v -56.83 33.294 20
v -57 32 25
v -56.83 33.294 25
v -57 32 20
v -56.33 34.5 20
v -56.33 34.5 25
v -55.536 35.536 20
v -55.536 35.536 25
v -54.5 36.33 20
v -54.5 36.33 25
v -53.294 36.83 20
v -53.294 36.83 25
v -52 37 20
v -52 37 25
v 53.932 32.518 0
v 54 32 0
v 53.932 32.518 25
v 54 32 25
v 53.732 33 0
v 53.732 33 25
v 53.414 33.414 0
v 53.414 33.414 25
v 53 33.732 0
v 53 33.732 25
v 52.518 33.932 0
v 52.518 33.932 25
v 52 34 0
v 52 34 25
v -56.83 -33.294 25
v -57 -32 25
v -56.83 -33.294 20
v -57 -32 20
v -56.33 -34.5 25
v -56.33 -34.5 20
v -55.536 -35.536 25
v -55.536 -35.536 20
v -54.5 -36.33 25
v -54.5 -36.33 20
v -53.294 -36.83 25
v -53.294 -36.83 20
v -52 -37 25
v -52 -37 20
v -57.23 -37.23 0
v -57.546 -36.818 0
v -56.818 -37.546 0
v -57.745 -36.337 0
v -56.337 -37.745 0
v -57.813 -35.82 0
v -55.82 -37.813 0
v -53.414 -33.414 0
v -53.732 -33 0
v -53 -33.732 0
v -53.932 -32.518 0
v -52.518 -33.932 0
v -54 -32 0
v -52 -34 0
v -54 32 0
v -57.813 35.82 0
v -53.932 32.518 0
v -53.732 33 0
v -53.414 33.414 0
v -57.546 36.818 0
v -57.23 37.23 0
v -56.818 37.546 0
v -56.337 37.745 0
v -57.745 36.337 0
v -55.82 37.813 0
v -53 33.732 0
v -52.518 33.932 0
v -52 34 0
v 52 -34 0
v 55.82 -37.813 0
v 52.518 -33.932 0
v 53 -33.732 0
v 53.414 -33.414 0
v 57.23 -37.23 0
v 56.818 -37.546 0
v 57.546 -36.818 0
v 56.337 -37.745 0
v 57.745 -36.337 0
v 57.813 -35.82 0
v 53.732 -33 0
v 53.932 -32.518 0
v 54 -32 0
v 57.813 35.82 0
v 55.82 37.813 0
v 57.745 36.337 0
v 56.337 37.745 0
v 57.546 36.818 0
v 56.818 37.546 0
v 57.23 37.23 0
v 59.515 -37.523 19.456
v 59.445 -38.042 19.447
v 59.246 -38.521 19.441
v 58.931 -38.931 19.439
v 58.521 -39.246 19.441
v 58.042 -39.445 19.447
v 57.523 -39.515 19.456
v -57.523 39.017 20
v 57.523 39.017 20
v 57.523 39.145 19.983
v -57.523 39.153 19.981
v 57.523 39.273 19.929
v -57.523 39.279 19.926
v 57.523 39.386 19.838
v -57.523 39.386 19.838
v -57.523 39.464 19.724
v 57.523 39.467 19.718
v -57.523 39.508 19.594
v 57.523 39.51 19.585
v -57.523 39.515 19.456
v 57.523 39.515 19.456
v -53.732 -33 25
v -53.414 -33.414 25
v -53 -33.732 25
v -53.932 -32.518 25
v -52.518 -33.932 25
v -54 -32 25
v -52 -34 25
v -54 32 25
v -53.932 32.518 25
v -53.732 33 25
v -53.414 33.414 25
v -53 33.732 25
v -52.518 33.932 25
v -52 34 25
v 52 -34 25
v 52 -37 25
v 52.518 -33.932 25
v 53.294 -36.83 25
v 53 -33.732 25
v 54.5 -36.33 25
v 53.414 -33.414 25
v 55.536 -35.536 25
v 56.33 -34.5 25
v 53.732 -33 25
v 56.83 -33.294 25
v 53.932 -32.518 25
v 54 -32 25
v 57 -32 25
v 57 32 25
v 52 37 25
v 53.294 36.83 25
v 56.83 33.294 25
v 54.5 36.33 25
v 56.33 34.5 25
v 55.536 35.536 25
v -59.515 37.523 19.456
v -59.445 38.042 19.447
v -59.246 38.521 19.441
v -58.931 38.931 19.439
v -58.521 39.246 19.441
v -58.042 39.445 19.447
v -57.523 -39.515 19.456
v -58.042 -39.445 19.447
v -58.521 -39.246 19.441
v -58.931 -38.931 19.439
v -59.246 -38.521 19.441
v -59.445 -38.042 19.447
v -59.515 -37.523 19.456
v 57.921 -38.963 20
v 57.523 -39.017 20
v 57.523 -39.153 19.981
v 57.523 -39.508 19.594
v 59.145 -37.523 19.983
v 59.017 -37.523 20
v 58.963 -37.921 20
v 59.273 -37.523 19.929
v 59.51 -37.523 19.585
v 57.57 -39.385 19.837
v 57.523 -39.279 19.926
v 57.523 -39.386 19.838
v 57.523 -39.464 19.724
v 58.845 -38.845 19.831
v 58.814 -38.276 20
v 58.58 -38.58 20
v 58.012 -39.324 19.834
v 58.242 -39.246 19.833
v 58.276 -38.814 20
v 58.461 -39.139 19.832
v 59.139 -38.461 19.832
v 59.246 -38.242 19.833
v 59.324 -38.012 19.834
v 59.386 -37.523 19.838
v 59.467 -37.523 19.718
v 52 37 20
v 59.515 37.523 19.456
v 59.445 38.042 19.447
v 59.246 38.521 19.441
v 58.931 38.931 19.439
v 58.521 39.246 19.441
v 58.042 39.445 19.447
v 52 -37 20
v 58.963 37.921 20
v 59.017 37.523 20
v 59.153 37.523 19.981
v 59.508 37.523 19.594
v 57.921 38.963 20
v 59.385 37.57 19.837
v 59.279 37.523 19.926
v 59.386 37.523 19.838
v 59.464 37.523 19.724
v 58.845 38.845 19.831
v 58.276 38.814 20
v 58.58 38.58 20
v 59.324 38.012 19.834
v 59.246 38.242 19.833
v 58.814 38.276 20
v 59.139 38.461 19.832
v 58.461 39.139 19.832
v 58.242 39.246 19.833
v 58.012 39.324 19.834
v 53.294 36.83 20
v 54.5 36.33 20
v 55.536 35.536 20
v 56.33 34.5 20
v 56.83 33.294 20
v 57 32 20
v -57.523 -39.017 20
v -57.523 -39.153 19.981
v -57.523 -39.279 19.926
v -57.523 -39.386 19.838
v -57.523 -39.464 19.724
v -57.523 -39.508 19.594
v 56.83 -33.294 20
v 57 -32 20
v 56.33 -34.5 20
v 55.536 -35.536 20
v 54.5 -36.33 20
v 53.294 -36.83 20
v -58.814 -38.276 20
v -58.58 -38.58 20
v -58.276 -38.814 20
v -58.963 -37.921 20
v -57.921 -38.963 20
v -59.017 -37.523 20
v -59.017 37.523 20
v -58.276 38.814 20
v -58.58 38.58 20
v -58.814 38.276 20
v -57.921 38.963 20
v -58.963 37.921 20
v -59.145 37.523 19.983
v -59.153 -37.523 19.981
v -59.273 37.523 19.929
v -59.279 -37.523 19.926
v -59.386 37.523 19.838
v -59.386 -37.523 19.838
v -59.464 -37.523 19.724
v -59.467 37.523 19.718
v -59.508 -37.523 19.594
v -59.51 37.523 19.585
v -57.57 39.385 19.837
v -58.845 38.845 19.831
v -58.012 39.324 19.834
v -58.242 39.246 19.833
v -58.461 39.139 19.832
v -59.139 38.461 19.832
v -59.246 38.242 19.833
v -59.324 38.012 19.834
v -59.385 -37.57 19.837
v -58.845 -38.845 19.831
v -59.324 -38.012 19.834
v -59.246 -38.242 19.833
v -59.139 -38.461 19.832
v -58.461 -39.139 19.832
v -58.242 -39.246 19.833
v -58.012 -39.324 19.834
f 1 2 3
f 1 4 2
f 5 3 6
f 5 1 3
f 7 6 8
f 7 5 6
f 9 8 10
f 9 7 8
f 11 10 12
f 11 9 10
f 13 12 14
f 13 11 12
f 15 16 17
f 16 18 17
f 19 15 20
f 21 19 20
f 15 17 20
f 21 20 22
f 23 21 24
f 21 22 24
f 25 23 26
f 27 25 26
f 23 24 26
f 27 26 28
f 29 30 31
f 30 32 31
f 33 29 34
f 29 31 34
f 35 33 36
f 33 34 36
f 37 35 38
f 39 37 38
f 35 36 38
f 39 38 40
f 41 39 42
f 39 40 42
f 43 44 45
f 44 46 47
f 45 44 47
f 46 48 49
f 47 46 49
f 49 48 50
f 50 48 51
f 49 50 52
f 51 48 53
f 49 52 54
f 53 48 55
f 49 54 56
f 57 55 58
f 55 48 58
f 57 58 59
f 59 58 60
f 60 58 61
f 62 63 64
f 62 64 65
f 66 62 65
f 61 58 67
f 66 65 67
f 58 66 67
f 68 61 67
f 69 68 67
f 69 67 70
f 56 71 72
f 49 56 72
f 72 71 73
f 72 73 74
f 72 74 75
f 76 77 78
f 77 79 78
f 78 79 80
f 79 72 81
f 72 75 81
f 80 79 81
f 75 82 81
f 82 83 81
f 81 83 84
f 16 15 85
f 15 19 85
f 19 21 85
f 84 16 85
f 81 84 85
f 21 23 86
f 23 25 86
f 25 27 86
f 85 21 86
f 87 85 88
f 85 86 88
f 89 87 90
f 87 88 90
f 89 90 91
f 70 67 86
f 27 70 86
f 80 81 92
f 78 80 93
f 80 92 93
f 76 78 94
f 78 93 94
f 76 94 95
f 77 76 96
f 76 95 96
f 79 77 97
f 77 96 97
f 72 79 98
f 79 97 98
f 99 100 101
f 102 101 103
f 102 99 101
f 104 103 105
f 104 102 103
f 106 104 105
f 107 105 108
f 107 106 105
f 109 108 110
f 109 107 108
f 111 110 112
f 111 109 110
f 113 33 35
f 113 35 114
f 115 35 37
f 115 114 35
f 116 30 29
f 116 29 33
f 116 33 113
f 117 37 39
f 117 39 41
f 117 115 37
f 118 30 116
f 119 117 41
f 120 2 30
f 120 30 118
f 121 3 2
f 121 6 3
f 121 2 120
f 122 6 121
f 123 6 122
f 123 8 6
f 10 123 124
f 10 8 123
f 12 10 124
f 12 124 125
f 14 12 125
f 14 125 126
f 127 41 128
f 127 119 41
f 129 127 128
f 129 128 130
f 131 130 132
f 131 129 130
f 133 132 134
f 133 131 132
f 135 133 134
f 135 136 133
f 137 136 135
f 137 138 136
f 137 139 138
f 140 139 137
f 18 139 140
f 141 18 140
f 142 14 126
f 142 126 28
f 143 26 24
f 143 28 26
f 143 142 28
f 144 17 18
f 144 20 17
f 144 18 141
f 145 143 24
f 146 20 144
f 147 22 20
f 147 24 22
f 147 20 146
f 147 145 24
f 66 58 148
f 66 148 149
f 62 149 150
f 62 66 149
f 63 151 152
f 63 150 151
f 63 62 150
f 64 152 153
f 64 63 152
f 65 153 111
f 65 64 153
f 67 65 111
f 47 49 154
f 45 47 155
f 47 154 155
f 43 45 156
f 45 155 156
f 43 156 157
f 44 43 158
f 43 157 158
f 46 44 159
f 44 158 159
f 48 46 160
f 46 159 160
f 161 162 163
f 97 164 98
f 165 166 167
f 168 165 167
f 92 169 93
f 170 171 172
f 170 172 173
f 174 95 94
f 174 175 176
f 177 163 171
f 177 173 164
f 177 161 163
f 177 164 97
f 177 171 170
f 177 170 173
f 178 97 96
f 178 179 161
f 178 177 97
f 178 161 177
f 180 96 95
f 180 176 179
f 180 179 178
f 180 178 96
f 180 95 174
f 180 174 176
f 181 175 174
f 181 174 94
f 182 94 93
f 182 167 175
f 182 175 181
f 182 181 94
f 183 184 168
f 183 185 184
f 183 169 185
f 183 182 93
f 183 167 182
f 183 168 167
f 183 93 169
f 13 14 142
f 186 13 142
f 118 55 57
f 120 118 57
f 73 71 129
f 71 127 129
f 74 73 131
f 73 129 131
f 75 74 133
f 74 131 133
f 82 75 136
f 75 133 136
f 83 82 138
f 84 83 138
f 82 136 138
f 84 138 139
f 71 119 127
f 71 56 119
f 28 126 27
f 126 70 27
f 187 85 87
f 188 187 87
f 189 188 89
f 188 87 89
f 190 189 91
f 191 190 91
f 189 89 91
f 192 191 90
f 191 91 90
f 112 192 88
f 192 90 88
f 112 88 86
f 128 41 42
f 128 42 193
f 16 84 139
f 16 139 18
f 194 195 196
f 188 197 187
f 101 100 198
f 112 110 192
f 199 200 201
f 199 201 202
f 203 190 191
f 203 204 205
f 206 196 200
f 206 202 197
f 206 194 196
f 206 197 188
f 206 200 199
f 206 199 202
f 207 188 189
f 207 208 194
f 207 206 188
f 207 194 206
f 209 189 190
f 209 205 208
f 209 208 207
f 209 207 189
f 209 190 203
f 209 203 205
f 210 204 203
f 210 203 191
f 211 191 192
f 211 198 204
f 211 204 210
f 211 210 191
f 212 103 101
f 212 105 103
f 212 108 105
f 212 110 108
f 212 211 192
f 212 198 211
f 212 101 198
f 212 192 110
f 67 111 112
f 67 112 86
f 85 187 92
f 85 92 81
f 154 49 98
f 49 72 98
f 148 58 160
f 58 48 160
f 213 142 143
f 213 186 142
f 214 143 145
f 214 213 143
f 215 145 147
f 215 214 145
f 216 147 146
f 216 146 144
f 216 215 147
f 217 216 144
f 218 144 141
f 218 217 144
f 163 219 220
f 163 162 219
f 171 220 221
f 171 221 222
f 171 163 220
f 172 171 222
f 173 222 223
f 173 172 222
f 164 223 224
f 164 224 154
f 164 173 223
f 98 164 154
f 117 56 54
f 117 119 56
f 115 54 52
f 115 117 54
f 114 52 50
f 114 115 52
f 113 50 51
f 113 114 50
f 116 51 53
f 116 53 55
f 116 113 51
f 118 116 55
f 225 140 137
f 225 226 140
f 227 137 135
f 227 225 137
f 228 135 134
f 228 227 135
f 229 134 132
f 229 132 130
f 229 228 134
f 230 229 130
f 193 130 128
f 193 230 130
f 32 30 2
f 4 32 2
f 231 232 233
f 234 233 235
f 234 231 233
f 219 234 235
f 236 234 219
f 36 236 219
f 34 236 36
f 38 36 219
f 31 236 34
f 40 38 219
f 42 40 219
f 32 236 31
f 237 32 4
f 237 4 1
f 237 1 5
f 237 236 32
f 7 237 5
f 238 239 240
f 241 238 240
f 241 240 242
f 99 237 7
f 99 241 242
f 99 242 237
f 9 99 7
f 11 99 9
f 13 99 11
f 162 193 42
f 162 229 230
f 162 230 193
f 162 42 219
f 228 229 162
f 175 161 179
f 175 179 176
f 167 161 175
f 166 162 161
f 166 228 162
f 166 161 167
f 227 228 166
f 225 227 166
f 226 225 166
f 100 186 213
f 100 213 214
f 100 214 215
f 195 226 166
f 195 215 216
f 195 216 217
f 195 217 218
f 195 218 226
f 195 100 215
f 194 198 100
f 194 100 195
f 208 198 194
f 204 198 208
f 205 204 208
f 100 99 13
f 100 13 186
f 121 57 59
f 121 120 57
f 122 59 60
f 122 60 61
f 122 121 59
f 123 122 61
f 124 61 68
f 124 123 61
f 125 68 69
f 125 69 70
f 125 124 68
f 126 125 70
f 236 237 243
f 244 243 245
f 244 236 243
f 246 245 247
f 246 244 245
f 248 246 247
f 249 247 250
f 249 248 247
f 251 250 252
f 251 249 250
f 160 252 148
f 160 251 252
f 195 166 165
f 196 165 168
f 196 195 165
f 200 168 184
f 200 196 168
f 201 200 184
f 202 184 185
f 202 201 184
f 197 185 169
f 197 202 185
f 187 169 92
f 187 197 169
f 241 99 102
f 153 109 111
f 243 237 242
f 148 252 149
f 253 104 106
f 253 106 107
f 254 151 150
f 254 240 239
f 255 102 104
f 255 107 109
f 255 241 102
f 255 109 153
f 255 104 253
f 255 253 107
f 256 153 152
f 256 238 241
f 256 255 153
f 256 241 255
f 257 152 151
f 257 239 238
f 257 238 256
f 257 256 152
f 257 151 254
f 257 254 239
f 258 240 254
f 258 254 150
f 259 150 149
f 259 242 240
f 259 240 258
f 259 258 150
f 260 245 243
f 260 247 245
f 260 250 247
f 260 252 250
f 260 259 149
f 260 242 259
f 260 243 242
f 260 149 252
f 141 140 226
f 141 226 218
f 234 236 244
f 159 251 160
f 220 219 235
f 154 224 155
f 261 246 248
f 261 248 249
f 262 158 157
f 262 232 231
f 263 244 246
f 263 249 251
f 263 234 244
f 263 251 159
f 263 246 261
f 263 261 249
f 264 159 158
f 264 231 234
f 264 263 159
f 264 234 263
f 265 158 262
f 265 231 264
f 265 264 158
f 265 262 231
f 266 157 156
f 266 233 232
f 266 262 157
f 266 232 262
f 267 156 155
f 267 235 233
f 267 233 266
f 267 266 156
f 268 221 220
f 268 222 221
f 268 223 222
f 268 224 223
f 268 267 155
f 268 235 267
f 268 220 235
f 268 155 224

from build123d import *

# Parameters (mm, degrees)
F0_W          = 120
F0_H          = 80
F0_W_2        = 108
F0_H_2        = 68
F1_DEPTH      = 25
F3_DEPTH      = 80.001
F5_DEPTH      = 60.001
F5_DEPTH_BACK = 60.001
F6_W          = 120
F6_H          = 80
F6_W_2        = 114
F6_H_2        = 74
F7_DEPTH      = 5
F8_R          = 5
F9_R          = 2
F10_R         = 0.5
F11_R         = 2


with BuildPart() as f1:
    # F0 (on Top) → F1 (new body)
    with BuildSketch(Plane.XY):
        Rectangle(F0_W, F0_H)
        Rectangle(F0_W_2, F0_H_2, mode=Mode.SUBTRACT)
    extrude(amount=F1_DEPTH)

    # F2 (on face) → F3 (cut, through all)
    with BuildSketch(Plane.XZ.offset(40)):
        Polygon((-57.8127834119, 0), (-60, 25), (-75, 25), (-75, -19.6831412613), (75, -19.6831412613), (75, 25), (60, 25), (57.8127834119, 0), align=None)
    extrude(amount=-F3_DEPTH, mode=Mode.SUBTRACT)

    # F4 (on Right) → F5 (cut, two sides)
    with BuildSketch(Plane.YZ) as f5_sk:
        Polygon((55, 25), (40, 25), (37.8127834119, 0), (-37.8127834119, 0), (-40, 25), (-55, 25), (-55, -15), (55, -15), align=None)
    extrude(amount=-F5_DEPTH, mode=Mode.SUBTRACT)
    extrude(f5_sk.sketch, amount=F5_DEPTH_BACK, mode=Mode.SUBTRACT)

    # F6 (on face) → F7 (cut)
    with BuildSketch(Plane.XY.offset(25)):
        Rectangle(F6_W, F6_H)
        Rectangle(F6_W_2, F6_H_2, mode=Mode.SUBTRACT)
    extrude(amount=-F7_DEPTH, mode=Mode.SUBTRACT)

    # F8
    f8_edges = [f1.edges().sort_by_distance(p)[0] for p in [
        (-57, -37, 22.5),
        (-57, 37, 22.5),
        (57, -37, 22.5),
        (57, 37, 22.5),
    ]]
    fillet(f8_edges, radius=F8_R)

    # F9
    f9_edges = [f1.edges().sort_by_distance(p)[0] for p in [
        (-58.68767, -38.68767, 10),
        (-58.68767, 38.68767, 10),
        (58.68767, -38.68767, 10),
        (58.68767, 38.68767, 10),
    ]]
    fillet(f9_edges, radius=F9_R)

    # F10
    f10_edges = [f1.edges().sort_by_distance(p)[0] for p in [
        (0, -39.562557, 20),
    ]]
    fillet(f10_edges, radius=F10_R)

    # F11
    f11_edges = [f1.edges().sort_by_distance(p)[0] for p in [
        (-54, 34, 12.5),
        (-54, -34, 12.5),
        (54, -34, 12.5),
        (54, 34, 12.5),
    ]]
    fillet(f11_edges, radius=F11_R)


solid = f1.part
